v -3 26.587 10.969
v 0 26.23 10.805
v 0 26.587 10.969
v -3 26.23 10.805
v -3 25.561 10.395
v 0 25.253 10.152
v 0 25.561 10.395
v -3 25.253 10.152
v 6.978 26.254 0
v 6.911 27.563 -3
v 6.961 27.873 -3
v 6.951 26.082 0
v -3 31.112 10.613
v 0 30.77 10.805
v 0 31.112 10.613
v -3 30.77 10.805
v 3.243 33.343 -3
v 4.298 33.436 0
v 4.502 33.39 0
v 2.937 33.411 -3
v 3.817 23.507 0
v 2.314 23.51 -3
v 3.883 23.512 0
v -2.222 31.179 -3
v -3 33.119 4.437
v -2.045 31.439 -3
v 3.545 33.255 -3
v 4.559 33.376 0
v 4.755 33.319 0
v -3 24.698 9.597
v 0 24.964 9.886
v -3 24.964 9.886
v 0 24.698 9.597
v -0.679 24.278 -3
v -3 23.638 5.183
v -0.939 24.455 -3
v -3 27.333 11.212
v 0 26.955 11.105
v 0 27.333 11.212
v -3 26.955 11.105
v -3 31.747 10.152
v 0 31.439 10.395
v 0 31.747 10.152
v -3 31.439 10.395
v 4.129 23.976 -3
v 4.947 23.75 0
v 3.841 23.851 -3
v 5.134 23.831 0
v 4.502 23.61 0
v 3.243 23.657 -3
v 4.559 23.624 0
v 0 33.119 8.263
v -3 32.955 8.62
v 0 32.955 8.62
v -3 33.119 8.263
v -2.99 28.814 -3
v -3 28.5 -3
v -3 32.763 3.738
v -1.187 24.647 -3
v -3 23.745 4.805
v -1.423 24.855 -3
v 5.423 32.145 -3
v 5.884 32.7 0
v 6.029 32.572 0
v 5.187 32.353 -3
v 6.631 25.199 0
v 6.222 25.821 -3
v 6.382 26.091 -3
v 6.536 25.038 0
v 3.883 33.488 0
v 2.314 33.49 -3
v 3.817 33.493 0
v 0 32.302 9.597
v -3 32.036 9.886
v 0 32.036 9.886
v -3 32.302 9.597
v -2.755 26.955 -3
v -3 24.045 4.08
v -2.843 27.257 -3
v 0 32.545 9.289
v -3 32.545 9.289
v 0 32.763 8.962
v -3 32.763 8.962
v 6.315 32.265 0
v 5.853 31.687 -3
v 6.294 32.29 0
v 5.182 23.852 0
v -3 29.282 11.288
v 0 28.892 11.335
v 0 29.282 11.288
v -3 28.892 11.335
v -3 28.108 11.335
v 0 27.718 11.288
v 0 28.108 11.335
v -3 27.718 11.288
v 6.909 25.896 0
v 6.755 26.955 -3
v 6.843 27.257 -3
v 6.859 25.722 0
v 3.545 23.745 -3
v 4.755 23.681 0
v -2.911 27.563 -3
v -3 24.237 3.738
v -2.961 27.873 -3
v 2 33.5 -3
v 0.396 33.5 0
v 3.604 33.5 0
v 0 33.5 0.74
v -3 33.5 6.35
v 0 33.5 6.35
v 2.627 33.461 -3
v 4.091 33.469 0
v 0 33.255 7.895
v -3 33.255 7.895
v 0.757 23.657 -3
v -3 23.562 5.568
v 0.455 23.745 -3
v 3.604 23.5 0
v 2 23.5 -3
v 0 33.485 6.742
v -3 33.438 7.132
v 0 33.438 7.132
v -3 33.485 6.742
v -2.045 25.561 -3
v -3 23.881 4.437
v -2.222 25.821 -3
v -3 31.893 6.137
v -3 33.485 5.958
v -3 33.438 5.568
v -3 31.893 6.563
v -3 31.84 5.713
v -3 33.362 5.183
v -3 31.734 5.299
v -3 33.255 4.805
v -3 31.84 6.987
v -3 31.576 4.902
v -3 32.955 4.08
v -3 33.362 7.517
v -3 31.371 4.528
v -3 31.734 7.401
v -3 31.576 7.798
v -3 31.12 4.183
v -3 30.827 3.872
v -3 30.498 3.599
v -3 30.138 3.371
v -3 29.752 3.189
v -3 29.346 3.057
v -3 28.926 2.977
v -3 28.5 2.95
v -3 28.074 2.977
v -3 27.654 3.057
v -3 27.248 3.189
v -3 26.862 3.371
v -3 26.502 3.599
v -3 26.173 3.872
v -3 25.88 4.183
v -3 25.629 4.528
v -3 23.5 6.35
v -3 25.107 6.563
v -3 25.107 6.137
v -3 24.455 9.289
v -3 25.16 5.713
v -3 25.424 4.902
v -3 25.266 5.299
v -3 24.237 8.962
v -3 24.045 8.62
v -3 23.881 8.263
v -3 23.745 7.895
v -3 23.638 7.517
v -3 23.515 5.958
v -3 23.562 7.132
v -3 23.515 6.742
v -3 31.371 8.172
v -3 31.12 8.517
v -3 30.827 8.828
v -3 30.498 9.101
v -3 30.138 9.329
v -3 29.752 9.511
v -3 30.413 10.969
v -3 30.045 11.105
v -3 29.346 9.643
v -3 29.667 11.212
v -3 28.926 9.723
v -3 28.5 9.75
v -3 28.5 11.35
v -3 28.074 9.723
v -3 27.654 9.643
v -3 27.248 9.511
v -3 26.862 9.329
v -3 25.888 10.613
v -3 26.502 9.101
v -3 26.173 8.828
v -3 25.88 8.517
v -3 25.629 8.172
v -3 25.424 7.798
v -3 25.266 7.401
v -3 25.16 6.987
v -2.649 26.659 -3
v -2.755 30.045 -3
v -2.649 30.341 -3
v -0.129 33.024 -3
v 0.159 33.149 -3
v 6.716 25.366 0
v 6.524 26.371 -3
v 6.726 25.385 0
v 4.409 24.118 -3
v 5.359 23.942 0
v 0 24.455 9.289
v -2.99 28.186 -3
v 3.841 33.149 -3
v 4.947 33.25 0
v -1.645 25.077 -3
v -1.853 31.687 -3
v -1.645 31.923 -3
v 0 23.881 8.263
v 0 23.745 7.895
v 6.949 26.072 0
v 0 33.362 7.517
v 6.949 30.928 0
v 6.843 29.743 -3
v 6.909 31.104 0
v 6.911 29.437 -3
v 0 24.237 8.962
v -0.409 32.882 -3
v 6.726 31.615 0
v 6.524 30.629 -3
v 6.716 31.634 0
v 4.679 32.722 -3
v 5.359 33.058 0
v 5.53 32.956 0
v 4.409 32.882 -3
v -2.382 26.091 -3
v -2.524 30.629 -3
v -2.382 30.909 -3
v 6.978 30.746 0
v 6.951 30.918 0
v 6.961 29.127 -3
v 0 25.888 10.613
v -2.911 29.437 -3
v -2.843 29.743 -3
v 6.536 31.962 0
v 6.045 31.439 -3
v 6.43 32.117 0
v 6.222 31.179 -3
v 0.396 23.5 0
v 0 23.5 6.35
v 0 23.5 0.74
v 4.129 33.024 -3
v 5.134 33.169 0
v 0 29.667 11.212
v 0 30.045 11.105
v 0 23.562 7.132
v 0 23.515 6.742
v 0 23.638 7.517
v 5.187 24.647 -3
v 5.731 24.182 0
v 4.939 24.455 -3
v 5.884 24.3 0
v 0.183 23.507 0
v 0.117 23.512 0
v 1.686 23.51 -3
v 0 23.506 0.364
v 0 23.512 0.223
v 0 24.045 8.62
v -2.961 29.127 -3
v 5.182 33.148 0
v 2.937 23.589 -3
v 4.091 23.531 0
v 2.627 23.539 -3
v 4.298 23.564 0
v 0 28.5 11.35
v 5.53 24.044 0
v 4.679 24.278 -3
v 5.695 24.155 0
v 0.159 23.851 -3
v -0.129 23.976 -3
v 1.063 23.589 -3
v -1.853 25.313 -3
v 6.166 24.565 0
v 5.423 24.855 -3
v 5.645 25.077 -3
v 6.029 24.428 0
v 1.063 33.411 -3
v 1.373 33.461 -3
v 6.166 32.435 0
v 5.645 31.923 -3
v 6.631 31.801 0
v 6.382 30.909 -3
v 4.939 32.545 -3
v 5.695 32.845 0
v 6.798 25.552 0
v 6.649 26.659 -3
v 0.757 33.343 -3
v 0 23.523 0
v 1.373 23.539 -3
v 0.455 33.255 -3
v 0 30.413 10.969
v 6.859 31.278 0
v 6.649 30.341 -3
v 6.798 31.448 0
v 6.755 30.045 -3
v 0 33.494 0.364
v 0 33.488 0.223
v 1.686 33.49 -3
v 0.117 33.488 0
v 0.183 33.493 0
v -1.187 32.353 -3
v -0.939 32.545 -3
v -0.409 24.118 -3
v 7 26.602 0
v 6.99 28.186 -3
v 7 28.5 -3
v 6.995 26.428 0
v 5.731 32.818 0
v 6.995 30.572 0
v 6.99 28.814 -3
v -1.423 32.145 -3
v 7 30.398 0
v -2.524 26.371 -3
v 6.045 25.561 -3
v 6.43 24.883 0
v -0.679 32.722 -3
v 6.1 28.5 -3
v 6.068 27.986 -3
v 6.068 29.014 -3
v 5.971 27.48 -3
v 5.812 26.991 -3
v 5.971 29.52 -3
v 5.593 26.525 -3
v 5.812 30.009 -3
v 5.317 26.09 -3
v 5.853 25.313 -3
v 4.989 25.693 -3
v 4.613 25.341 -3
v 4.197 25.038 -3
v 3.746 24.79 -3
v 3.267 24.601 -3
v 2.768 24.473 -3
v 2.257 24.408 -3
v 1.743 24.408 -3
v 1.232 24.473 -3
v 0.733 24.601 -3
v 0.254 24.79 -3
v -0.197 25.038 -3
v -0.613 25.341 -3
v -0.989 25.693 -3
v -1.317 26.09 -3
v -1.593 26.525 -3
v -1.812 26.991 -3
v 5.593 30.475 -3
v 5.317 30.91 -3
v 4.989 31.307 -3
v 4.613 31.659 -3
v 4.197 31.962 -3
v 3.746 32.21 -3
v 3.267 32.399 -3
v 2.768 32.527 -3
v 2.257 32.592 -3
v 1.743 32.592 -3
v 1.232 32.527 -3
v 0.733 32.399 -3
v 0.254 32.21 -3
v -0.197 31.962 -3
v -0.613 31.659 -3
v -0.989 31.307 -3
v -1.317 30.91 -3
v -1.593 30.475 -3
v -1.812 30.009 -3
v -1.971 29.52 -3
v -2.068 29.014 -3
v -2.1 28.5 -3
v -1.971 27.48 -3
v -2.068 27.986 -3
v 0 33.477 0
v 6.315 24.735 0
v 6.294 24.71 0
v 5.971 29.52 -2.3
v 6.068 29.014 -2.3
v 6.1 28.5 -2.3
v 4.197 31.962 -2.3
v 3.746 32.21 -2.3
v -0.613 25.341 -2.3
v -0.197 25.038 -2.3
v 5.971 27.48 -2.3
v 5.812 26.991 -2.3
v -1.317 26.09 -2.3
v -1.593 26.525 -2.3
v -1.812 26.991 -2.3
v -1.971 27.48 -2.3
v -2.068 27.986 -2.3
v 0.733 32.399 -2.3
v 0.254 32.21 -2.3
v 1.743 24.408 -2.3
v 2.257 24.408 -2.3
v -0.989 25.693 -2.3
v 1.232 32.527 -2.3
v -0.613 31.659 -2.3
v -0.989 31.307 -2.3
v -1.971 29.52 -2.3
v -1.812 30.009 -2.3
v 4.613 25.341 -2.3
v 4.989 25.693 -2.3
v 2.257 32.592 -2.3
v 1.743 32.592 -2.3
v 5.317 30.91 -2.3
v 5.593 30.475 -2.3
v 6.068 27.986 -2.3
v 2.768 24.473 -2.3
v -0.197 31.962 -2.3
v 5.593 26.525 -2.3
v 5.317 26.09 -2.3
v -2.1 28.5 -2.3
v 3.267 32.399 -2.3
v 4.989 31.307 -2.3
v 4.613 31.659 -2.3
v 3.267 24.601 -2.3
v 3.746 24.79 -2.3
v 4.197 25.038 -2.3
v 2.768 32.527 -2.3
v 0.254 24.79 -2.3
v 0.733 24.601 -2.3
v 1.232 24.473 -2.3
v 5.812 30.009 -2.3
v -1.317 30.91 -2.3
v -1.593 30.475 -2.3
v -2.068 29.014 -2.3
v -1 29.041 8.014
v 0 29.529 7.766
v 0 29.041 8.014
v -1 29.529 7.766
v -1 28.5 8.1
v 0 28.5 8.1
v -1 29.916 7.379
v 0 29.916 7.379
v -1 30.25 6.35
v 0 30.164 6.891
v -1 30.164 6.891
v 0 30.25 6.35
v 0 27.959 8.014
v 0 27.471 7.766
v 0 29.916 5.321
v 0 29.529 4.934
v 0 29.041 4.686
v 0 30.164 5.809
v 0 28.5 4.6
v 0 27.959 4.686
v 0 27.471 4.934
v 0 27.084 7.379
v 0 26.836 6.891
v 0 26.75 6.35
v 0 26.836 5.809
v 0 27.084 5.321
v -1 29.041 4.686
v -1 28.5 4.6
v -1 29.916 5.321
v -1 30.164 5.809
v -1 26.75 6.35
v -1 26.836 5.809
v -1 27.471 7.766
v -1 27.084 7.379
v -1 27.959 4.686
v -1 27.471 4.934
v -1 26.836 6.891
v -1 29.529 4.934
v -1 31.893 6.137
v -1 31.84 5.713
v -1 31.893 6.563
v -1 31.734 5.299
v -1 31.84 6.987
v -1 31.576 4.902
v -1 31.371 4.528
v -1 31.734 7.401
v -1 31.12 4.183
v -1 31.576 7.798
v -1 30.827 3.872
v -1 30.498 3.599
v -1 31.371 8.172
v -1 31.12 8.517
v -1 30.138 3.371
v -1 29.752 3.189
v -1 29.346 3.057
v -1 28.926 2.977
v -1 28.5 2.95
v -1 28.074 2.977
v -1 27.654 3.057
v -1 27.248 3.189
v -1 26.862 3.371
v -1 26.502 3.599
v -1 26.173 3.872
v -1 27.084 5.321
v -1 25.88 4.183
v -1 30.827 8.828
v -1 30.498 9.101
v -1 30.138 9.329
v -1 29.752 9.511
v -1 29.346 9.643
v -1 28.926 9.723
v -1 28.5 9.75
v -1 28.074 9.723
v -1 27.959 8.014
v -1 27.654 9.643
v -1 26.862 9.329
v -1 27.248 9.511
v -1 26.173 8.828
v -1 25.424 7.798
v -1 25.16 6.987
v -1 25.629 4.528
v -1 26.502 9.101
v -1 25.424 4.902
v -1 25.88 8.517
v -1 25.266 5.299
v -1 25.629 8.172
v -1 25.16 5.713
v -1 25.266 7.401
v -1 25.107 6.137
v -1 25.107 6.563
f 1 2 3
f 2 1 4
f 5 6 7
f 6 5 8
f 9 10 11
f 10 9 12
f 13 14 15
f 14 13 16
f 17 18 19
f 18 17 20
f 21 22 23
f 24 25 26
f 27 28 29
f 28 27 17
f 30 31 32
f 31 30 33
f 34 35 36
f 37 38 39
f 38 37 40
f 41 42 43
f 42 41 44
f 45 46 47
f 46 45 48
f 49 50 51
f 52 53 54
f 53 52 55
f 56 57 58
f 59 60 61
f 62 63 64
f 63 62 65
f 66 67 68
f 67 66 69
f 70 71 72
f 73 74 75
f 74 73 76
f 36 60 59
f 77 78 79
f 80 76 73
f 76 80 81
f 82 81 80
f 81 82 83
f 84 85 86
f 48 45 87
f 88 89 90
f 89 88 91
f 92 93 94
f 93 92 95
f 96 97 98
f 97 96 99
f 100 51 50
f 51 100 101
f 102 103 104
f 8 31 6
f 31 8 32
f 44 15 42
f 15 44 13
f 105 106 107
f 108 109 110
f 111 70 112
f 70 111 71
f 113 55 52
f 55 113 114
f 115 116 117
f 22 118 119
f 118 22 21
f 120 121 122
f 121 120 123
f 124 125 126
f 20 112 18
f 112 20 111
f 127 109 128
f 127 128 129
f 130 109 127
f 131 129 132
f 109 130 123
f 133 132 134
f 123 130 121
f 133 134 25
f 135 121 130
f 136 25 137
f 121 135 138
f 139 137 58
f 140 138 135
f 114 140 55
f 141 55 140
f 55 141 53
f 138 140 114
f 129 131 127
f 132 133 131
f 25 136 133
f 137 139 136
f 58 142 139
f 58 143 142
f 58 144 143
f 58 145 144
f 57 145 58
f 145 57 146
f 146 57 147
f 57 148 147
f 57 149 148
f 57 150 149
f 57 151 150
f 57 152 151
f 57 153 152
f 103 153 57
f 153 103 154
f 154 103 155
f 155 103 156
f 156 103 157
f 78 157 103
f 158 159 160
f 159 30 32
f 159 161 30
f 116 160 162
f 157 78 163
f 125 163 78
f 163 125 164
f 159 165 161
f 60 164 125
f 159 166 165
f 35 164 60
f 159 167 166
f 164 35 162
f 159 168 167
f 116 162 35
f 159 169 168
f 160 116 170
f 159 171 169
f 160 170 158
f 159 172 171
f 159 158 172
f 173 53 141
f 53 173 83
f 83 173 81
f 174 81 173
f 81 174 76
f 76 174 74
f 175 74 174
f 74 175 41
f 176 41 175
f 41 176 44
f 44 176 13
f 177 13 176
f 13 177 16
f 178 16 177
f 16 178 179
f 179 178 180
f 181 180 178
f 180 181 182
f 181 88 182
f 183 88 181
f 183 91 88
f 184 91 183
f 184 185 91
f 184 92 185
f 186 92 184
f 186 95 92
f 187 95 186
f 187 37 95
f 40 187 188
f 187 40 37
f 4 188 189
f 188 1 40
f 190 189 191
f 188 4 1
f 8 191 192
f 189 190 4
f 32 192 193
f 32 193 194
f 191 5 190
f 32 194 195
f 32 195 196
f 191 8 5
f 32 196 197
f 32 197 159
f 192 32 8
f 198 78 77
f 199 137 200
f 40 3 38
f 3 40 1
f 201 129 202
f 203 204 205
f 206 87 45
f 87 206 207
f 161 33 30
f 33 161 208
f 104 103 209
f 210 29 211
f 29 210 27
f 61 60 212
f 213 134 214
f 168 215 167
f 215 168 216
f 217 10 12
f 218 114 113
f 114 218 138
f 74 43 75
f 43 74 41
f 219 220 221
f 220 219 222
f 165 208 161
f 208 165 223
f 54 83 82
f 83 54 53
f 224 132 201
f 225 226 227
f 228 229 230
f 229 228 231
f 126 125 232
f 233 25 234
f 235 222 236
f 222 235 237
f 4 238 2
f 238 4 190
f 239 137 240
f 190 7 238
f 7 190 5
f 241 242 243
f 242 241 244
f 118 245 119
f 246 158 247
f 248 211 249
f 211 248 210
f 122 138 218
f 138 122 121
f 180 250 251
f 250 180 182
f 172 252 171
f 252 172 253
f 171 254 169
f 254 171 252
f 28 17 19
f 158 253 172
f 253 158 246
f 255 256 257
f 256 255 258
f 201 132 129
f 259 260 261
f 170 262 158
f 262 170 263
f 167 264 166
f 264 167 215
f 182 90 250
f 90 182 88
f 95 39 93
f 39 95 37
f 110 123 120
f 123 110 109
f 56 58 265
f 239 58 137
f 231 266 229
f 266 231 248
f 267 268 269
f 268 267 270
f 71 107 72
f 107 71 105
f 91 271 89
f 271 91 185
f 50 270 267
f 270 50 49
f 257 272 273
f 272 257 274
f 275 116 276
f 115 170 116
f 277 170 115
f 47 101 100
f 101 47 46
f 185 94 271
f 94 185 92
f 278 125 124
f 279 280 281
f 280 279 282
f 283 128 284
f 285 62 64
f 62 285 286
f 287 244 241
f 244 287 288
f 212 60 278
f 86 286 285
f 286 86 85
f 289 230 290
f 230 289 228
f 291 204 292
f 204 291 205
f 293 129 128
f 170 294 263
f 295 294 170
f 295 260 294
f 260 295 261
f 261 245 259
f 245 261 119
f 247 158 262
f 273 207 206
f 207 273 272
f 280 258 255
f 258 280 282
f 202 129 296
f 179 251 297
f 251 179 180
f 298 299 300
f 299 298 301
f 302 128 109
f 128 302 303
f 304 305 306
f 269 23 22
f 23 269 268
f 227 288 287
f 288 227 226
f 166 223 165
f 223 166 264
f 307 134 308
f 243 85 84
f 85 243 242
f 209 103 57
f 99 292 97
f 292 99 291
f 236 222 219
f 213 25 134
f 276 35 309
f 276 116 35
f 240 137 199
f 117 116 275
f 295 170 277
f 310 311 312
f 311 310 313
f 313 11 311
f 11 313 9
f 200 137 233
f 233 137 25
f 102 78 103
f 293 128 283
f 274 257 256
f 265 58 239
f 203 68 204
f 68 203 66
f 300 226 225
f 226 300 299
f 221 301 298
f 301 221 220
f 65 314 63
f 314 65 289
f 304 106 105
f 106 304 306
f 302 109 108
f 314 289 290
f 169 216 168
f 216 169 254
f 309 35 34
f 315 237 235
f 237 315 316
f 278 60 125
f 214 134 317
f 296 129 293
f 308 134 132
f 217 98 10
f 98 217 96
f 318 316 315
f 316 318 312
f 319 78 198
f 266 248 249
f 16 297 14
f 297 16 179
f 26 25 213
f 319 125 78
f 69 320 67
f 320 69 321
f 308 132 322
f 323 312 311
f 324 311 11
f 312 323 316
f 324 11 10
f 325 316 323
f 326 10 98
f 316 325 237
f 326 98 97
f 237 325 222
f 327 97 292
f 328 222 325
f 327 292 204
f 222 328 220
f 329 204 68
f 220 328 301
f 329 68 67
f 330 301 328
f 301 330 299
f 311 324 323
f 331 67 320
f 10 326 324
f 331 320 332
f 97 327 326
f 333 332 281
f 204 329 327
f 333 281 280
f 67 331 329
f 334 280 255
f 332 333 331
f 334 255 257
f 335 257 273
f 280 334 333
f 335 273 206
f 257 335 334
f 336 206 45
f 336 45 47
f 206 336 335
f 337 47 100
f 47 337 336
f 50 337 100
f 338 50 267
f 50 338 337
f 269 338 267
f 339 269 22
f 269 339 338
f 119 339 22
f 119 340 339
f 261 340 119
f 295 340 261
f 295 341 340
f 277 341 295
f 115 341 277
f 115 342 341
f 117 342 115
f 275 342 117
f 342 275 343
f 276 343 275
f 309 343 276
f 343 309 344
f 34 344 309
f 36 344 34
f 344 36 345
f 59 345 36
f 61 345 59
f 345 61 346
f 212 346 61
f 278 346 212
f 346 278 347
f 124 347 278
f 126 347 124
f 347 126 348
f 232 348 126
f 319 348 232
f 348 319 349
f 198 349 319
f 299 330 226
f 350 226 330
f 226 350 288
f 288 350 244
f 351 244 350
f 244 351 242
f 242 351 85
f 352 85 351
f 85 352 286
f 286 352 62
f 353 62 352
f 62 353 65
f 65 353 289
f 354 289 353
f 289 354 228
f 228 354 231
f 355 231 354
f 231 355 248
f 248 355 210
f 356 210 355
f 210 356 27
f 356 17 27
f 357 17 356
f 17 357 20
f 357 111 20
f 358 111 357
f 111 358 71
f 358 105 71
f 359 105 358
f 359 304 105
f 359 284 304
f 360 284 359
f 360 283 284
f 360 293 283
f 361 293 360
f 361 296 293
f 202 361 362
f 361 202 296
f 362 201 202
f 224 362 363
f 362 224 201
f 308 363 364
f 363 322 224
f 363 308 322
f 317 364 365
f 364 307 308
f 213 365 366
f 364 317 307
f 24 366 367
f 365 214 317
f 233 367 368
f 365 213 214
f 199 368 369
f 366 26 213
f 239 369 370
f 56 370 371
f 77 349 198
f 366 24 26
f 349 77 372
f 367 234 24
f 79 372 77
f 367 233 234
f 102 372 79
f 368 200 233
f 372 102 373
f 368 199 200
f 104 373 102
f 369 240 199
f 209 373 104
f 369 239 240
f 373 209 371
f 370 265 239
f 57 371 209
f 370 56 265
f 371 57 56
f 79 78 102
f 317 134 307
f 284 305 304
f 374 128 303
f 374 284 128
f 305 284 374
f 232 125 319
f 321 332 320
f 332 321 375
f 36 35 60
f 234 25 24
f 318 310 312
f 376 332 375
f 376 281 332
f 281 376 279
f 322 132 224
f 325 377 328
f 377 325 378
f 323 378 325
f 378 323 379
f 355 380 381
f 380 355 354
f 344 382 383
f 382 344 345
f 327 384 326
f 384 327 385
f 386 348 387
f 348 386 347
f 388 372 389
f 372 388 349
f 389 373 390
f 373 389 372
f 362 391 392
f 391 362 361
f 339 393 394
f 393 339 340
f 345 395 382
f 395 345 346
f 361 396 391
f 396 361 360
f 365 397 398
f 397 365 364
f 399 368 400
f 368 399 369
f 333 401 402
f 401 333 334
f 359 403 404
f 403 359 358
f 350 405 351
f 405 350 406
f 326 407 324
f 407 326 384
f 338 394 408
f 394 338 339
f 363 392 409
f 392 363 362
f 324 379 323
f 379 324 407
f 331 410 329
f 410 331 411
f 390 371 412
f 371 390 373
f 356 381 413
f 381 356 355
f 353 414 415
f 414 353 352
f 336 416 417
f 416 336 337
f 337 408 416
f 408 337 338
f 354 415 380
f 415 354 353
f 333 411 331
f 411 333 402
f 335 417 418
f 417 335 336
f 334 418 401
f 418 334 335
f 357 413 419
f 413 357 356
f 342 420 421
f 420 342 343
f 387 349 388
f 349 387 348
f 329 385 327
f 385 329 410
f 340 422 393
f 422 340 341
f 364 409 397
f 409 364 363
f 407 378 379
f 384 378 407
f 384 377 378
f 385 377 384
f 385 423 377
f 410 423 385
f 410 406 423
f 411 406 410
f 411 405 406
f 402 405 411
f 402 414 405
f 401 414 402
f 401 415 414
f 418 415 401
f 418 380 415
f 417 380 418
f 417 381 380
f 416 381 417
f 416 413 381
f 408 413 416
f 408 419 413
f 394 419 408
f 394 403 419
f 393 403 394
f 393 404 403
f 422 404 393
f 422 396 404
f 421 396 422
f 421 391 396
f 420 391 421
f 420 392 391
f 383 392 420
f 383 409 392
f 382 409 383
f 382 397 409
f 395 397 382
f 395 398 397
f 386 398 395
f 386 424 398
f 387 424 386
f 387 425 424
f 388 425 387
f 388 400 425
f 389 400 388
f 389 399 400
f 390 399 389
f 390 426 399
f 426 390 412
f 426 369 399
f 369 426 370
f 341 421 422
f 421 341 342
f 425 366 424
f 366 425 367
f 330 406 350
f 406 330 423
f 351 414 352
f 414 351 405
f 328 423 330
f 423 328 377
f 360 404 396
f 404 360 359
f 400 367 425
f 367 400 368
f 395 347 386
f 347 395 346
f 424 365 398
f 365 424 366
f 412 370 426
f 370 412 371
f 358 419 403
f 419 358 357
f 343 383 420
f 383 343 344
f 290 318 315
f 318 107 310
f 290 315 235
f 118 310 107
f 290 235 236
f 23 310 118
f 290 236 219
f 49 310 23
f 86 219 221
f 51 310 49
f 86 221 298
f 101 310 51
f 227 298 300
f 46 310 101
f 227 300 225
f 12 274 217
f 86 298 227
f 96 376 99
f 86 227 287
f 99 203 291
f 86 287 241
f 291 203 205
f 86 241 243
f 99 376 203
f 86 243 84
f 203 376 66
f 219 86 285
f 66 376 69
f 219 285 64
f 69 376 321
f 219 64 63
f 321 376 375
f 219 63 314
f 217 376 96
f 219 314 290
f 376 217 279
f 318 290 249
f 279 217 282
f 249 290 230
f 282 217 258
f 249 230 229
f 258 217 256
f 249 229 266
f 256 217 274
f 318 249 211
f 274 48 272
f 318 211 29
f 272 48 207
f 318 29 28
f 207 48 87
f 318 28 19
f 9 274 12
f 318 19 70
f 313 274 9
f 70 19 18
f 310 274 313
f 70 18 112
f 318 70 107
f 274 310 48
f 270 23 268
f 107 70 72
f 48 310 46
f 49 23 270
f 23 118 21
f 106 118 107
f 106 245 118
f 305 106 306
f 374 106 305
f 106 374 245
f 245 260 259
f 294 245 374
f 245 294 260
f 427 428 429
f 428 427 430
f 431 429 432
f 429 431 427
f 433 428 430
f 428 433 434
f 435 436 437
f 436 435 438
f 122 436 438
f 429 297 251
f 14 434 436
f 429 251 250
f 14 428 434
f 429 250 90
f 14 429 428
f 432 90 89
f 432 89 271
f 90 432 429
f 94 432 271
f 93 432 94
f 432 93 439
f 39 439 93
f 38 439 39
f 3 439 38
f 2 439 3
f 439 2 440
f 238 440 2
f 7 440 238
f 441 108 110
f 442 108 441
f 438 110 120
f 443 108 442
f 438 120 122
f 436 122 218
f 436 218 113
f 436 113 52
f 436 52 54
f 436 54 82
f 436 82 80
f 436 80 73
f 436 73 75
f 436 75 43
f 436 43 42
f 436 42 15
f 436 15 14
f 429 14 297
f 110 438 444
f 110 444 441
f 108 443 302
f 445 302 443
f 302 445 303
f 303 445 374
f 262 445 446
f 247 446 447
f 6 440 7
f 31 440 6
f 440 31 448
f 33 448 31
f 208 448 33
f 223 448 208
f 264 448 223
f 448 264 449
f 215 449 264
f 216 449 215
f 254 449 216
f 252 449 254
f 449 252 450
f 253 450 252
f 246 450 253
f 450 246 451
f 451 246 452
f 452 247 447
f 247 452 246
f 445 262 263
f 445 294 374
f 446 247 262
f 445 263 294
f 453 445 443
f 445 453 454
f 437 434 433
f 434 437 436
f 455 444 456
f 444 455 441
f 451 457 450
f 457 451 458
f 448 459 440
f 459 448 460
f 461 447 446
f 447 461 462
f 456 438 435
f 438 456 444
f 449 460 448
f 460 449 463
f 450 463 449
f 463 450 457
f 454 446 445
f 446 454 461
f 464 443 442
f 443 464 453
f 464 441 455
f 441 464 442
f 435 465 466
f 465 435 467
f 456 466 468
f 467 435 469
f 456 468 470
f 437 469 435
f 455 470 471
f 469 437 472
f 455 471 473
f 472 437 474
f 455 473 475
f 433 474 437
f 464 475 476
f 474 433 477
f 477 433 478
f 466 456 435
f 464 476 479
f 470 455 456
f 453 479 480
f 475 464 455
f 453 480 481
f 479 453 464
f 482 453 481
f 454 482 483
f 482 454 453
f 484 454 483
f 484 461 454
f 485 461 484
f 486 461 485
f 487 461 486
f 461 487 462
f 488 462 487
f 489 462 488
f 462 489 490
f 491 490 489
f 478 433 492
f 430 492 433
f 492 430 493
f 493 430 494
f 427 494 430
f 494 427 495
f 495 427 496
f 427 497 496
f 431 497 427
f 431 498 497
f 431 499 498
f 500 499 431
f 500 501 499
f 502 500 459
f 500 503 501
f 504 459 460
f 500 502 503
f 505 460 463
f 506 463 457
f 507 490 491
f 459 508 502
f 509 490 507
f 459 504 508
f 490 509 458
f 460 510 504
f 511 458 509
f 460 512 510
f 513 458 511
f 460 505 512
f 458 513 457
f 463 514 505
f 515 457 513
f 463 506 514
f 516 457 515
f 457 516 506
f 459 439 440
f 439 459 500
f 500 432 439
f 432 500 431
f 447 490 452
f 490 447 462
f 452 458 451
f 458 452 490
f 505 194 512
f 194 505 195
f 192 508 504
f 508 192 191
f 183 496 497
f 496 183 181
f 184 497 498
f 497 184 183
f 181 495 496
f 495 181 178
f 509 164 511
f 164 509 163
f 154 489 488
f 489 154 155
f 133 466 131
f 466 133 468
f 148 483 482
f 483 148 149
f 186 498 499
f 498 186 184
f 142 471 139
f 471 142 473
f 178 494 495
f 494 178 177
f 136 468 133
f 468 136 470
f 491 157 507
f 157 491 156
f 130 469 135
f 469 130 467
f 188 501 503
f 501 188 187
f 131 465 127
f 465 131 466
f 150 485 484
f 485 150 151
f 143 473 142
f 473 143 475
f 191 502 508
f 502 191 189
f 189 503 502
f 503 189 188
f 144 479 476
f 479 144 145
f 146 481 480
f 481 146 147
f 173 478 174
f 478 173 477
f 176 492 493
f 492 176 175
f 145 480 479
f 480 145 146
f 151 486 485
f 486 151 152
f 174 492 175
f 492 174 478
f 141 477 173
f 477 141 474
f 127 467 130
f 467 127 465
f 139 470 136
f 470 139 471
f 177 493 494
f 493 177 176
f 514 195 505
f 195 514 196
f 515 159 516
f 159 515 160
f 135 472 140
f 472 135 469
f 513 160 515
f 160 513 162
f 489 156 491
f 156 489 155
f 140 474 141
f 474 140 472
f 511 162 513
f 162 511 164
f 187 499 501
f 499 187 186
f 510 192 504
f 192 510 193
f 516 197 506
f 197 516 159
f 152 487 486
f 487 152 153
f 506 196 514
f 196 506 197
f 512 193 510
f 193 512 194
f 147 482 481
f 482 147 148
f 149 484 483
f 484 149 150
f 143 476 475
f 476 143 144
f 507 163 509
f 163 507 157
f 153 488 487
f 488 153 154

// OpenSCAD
// From: SFF-8301 3.5" Form Factor Drive Dimensions
// https://members.snia.org/document/dl/25861
// https://support.wdc.com/images/kb/2579-771970-A03.pdf
// a[1] = 17.8 or 26.1 or 42
$hdd__a = [0, 26.1,  147,   101.6, 95.25, 3.18,
              44.45, 41.28, 28.5,  101.6, 6.35,
              0.25,  0.5,   76.2];
$hdd__de_facto_side_hole = 41.61;
$hdd__width = $hdd__a[3];
$hdd__length = $hdd__a[2];
$hdd__height = $hdd__a[1];

hdd_foot();

module hdd_void() {
    a = $hdd__a;
    de_facto_side_hole = $hdd__de_facto_side_hole;
    width = $hdd__width;
    length = $hdd__length;
    height = $hdd__height;
    
    screw_d = 3.5;
    screw_h = 1;
    screw_head_d = 6.8;
    screw_head_h = 10;
    cube([a[3], a[2], a[1]]);
    
    module screw() {
        cylinder(d = screw_d, h = screw_h, $fn = 20);
        translate([0, 0, screw_h]) cylinder(d = screw_head_d, h = screw_head_h, $fn = 50);
    }
    module bottom_screw() rotate([180, 0, 0]) screw();
    translate([a[5], a[7]]) bottom_screw();
    translate([a[5], a[7] + a[6]]) bottom_screw();
    translate([a[5], a[7] + a[13]]) bottom_screw();
    translate([a[5] + a[4], a[7]]) bottom_screw();
    translate([a[5] + a[4], a[7] + a[6]]) bottom_screw();
    translate([a[5] + a[4], a[7] + a[13]]) bottom_screw();
    
    module left_screw() translate([0, 0, a[10]]) rotate([0, -90, 0]) screw();
    translate([0, a[8], 0]) left_screw();
    translate([0, a[8] + de_facto_side_hole, 0]) left_screw();
    translate([0, a[8] + a[9], 0]) left_screw();
    module right_screw() translate([width, 0, a[10]]) rotate([0, 90, 0]) screw();
    translate([0, a[8], 0]) right_screw();
    translate([0, a[8] + de_facto_side_hole, 0]) right_screw();
    translate([0, a[8] + a[9], 0]) right_screw();
}

module hdd_foot() {
    a = $hdd__a;
    width = $hdd__width;
    length = $hdd__length;
    height = $hdd__height;
    
    x_thickness = 3;
    y_thickness = 3;
    locator_thickness = 1;
    rubber_feet_d = 8 + 0.2;
    rubber_feet_h = 0.7;

    module foot() translate([10/2-x_thickness, 0, 0]) difference() {
        hull() {
            translate([10/2, 0, a[10]]) rotate([0, -90, 0]) cylinder(d = 10, h = 10, $fn = 80);
            translate([0, 0, -y_thickness]) cylinder(d = 10, h = 1, $fn = 100);
        }
        translate([0, 0, -y_thickness]) cylinder(d = rubber_feet_d, h = rubber_feet_h, $fn = 50);
    }

    difference() {
        translate([0, a[8], 0]) foot();
        #hdd_void();
    }
}
